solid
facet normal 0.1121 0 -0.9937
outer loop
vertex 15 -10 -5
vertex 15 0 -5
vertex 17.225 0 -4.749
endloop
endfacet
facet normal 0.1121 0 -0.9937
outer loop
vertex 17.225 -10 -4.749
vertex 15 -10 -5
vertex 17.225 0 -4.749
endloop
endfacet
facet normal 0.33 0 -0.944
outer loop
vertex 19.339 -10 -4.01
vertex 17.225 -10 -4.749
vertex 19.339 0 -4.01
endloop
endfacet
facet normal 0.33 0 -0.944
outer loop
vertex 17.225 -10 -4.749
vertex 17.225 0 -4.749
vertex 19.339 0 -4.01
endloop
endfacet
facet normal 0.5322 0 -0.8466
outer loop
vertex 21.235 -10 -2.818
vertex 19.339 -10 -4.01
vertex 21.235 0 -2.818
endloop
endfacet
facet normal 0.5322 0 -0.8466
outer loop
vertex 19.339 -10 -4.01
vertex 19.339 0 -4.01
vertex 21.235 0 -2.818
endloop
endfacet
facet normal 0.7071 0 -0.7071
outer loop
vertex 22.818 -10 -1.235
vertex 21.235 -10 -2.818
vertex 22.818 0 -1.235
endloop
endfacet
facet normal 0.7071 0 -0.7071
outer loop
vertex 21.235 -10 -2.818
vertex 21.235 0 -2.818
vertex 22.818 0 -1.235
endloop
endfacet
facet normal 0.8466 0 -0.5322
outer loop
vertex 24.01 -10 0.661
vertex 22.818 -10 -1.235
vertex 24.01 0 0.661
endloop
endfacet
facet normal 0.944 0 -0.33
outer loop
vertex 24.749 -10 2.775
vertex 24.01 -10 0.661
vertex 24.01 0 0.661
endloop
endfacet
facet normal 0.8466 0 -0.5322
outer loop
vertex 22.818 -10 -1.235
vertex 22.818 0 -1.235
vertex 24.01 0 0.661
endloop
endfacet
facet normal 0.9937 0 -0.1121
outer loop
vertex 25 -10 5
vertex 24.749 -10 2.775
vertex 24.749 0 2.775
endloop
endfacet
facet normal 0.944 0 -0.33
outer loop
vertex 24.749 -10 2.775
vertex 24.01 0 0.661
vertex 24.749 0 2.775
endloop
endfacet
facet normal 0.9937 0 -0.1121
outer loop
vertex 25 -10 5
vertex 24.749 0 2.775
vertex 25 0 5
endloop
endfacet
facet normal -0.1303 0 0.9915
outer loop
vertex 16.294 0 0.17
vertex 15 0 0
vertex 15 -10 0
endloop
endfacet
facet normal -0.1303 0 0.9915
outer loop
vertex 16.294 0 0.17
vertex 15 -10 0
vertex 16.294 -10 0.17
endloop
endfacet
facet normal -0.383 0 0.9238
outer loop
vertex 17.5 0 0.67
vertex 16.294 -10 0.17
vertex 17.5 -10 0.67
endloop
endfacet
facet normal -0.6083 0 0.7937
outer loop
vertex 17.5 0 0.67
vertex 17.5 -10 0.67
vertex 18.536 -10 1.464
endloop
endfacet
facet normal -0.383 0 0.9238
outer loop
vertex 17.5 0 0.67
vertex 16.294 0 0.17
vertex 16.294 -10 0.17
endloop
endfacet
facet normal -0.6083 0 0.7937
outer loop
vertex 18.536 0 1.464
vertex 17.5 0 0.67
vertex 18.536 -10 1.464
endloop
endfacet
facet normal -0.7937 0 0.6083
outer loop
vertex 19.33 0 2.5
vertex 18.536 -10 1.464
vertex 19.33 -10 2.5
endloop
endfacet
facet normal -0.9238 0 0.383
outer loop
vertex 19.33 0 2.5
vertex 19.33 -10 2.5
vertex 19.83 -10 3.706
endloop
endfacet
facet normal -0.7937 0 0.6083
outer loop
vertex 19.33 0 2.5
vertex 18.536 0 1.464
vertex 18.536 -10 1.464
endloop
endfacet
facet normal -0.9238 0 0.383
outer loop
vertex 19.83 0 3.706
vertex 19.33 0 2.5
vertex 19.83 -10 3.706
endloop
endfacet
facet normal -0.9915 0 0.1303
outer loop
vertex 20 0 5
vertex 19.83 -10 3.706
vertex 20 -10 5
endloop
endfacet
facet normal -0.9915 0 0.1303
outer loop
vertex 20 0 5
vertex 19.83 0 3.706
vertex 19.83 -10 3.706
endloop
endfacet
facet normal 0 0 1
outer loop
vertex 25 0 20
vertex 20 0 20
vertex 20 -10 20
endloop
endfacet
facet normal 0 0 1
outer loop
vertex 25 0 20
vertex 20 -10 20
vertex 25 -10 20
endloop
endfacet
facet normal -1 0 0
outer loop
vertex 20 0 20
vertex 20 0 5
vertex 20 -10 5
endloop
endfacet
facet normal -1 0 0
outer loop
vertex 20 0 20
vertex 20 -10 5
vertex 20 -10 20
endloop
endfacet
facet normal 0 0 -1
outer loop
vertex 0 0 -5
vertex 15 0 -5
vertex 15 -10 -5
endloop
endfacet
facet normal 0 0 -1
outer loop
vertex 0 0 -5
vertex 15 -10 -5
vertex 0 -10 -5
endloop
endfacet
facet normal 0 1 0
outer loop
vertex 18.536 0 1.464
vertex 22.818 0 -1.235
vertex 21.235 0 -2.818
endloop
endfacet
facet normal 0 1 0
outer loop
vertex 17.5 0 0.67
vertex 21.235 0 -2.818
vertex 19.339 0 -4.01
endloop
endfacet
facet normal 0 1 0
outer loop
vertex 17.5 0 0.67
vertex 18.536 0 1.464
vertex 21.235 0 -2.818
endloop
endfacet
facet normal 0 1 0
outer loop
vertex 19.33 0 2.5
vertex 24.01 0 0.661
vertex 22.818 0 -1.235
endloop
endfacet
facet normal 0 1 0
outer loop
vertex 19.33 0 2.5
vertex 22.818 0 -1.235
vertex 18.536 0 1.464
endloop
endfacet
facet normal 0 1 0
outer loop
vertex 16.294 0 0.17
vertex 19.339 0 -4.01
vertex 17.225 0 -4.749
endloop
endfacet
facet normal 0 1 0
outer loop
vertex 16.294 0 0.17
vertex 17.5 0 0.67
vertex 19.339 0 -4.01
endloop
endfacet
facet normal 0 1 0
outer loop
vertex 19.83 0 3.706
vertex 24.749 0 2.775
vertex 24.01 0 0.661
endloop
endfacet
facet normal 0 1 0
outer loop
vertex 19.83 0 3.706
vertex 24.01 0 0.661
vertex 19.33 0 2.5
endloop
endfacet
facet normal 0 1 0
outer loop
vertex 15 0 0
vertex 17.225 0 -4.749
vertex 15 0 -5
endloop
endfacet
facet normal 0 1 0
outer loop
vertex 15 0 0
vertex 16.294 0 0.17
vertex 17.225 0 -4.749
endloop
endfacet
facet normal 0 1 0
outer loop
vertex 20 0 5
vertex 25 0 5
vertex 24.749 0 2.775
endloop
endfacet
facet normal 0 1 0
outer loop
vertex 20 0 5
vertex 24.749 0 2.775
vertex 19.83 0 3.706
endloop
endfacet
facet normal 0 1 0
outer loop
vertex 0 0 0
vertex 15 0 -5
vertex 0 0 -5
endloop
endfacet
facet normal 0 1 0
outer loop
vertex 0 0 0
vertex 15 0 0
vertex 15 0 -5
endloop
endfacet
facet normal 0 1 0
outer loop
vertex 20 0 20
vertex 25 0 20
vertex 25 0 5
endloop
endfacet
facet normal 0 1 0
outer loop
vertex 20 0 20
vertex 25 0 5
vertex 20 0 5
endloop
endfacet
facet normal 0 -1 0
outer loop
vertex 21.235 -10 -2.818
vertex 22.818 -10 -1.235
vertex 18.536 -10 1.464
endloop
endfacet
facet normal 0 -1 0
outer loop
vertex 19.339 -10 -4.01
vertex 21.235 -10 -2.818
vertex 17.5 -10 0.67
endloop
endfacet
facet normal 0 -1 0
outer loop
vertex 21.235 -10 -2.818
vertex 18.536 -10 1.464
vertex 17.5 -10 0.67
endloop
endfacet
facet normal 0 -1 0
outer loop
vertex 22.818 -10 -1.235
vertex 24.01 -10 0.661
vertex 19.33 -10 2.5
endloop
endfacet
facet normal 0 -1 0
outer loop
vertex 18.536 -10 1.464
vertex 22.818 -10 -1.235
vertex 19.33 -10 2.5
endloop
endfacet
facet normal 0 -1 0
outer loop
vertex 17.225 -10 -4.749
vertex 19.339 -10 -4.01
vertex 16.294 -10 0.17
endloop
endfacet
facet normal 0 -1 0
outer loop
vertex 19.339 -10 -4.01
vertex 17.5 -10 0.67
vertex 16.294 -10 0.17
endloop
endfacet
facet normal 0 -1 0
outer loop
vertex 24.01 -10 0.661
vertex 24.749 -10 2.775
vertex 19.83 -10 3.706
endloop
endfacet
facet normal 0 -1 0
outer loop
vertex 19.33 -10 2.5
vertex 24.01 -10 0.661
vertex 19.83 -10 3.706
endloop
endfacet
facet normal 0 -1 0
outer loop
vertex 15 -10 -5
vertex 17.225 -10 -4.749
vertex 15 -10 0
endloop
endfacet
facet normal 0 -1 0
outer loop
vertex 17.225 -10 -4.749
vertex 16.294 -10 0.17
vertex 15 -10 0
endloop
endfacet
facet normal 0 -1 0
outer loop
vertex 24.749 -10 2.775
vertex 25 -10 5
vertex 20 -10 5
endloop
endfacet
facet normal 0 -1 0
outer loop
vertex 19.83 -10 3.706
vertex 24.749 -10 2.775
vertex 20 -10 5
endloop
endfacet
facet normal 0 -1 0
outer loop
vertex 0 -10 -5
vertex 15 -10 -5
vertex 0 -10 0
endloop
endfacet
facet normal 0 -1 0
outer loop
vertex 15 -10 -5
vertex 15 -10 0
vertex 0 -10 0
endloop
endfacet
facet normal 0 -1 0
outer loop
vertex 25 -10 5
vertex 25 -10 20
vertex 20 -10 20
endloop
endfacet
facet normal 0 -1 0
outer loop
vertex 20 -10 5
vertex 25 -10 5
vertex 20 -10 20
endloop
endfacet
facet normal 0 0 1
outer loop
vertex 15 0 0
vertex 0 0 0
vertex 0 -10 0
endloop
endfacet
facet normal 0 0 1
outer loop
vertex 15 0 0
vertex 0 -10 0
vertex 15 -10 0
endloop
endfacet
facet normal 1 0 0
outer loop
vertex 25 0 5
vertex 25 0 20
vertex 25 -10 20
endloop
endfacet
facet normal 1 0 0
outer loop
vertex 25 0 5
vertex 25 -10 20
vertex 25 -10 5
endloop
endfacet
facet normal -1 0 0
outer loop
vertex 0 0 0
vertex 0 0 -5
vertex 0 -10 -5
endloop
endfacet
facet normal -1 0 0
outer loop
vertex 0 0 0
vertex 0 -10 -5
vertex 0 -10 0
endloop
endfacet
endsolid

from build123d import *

# Parameters (mm, degrees)
PAD_DEPTH = 10


with BuildPart() as part:
    # Sketch → Pad (new body)
    with BuildSketch(Plane.XZ):
        with BuildLine():
            Line((0, 0), (15, 0))
            ThreePointArc((15, 0), (18.535534, 1.464466), (20, 5))
            Line((20, 5), (20, 20))
            Line((20, 20), (25, 20))
            Line((25, 20), (25, 5))
            ThreePointArc((15, -5), (22.071068, -2.071068), (25, 5))
            Line((15, -5), (0, -5))
            Line((0, -5), (0, 0))
        make_face()
    extrude(amount=PAD_DEPTH)


solid = part.part
